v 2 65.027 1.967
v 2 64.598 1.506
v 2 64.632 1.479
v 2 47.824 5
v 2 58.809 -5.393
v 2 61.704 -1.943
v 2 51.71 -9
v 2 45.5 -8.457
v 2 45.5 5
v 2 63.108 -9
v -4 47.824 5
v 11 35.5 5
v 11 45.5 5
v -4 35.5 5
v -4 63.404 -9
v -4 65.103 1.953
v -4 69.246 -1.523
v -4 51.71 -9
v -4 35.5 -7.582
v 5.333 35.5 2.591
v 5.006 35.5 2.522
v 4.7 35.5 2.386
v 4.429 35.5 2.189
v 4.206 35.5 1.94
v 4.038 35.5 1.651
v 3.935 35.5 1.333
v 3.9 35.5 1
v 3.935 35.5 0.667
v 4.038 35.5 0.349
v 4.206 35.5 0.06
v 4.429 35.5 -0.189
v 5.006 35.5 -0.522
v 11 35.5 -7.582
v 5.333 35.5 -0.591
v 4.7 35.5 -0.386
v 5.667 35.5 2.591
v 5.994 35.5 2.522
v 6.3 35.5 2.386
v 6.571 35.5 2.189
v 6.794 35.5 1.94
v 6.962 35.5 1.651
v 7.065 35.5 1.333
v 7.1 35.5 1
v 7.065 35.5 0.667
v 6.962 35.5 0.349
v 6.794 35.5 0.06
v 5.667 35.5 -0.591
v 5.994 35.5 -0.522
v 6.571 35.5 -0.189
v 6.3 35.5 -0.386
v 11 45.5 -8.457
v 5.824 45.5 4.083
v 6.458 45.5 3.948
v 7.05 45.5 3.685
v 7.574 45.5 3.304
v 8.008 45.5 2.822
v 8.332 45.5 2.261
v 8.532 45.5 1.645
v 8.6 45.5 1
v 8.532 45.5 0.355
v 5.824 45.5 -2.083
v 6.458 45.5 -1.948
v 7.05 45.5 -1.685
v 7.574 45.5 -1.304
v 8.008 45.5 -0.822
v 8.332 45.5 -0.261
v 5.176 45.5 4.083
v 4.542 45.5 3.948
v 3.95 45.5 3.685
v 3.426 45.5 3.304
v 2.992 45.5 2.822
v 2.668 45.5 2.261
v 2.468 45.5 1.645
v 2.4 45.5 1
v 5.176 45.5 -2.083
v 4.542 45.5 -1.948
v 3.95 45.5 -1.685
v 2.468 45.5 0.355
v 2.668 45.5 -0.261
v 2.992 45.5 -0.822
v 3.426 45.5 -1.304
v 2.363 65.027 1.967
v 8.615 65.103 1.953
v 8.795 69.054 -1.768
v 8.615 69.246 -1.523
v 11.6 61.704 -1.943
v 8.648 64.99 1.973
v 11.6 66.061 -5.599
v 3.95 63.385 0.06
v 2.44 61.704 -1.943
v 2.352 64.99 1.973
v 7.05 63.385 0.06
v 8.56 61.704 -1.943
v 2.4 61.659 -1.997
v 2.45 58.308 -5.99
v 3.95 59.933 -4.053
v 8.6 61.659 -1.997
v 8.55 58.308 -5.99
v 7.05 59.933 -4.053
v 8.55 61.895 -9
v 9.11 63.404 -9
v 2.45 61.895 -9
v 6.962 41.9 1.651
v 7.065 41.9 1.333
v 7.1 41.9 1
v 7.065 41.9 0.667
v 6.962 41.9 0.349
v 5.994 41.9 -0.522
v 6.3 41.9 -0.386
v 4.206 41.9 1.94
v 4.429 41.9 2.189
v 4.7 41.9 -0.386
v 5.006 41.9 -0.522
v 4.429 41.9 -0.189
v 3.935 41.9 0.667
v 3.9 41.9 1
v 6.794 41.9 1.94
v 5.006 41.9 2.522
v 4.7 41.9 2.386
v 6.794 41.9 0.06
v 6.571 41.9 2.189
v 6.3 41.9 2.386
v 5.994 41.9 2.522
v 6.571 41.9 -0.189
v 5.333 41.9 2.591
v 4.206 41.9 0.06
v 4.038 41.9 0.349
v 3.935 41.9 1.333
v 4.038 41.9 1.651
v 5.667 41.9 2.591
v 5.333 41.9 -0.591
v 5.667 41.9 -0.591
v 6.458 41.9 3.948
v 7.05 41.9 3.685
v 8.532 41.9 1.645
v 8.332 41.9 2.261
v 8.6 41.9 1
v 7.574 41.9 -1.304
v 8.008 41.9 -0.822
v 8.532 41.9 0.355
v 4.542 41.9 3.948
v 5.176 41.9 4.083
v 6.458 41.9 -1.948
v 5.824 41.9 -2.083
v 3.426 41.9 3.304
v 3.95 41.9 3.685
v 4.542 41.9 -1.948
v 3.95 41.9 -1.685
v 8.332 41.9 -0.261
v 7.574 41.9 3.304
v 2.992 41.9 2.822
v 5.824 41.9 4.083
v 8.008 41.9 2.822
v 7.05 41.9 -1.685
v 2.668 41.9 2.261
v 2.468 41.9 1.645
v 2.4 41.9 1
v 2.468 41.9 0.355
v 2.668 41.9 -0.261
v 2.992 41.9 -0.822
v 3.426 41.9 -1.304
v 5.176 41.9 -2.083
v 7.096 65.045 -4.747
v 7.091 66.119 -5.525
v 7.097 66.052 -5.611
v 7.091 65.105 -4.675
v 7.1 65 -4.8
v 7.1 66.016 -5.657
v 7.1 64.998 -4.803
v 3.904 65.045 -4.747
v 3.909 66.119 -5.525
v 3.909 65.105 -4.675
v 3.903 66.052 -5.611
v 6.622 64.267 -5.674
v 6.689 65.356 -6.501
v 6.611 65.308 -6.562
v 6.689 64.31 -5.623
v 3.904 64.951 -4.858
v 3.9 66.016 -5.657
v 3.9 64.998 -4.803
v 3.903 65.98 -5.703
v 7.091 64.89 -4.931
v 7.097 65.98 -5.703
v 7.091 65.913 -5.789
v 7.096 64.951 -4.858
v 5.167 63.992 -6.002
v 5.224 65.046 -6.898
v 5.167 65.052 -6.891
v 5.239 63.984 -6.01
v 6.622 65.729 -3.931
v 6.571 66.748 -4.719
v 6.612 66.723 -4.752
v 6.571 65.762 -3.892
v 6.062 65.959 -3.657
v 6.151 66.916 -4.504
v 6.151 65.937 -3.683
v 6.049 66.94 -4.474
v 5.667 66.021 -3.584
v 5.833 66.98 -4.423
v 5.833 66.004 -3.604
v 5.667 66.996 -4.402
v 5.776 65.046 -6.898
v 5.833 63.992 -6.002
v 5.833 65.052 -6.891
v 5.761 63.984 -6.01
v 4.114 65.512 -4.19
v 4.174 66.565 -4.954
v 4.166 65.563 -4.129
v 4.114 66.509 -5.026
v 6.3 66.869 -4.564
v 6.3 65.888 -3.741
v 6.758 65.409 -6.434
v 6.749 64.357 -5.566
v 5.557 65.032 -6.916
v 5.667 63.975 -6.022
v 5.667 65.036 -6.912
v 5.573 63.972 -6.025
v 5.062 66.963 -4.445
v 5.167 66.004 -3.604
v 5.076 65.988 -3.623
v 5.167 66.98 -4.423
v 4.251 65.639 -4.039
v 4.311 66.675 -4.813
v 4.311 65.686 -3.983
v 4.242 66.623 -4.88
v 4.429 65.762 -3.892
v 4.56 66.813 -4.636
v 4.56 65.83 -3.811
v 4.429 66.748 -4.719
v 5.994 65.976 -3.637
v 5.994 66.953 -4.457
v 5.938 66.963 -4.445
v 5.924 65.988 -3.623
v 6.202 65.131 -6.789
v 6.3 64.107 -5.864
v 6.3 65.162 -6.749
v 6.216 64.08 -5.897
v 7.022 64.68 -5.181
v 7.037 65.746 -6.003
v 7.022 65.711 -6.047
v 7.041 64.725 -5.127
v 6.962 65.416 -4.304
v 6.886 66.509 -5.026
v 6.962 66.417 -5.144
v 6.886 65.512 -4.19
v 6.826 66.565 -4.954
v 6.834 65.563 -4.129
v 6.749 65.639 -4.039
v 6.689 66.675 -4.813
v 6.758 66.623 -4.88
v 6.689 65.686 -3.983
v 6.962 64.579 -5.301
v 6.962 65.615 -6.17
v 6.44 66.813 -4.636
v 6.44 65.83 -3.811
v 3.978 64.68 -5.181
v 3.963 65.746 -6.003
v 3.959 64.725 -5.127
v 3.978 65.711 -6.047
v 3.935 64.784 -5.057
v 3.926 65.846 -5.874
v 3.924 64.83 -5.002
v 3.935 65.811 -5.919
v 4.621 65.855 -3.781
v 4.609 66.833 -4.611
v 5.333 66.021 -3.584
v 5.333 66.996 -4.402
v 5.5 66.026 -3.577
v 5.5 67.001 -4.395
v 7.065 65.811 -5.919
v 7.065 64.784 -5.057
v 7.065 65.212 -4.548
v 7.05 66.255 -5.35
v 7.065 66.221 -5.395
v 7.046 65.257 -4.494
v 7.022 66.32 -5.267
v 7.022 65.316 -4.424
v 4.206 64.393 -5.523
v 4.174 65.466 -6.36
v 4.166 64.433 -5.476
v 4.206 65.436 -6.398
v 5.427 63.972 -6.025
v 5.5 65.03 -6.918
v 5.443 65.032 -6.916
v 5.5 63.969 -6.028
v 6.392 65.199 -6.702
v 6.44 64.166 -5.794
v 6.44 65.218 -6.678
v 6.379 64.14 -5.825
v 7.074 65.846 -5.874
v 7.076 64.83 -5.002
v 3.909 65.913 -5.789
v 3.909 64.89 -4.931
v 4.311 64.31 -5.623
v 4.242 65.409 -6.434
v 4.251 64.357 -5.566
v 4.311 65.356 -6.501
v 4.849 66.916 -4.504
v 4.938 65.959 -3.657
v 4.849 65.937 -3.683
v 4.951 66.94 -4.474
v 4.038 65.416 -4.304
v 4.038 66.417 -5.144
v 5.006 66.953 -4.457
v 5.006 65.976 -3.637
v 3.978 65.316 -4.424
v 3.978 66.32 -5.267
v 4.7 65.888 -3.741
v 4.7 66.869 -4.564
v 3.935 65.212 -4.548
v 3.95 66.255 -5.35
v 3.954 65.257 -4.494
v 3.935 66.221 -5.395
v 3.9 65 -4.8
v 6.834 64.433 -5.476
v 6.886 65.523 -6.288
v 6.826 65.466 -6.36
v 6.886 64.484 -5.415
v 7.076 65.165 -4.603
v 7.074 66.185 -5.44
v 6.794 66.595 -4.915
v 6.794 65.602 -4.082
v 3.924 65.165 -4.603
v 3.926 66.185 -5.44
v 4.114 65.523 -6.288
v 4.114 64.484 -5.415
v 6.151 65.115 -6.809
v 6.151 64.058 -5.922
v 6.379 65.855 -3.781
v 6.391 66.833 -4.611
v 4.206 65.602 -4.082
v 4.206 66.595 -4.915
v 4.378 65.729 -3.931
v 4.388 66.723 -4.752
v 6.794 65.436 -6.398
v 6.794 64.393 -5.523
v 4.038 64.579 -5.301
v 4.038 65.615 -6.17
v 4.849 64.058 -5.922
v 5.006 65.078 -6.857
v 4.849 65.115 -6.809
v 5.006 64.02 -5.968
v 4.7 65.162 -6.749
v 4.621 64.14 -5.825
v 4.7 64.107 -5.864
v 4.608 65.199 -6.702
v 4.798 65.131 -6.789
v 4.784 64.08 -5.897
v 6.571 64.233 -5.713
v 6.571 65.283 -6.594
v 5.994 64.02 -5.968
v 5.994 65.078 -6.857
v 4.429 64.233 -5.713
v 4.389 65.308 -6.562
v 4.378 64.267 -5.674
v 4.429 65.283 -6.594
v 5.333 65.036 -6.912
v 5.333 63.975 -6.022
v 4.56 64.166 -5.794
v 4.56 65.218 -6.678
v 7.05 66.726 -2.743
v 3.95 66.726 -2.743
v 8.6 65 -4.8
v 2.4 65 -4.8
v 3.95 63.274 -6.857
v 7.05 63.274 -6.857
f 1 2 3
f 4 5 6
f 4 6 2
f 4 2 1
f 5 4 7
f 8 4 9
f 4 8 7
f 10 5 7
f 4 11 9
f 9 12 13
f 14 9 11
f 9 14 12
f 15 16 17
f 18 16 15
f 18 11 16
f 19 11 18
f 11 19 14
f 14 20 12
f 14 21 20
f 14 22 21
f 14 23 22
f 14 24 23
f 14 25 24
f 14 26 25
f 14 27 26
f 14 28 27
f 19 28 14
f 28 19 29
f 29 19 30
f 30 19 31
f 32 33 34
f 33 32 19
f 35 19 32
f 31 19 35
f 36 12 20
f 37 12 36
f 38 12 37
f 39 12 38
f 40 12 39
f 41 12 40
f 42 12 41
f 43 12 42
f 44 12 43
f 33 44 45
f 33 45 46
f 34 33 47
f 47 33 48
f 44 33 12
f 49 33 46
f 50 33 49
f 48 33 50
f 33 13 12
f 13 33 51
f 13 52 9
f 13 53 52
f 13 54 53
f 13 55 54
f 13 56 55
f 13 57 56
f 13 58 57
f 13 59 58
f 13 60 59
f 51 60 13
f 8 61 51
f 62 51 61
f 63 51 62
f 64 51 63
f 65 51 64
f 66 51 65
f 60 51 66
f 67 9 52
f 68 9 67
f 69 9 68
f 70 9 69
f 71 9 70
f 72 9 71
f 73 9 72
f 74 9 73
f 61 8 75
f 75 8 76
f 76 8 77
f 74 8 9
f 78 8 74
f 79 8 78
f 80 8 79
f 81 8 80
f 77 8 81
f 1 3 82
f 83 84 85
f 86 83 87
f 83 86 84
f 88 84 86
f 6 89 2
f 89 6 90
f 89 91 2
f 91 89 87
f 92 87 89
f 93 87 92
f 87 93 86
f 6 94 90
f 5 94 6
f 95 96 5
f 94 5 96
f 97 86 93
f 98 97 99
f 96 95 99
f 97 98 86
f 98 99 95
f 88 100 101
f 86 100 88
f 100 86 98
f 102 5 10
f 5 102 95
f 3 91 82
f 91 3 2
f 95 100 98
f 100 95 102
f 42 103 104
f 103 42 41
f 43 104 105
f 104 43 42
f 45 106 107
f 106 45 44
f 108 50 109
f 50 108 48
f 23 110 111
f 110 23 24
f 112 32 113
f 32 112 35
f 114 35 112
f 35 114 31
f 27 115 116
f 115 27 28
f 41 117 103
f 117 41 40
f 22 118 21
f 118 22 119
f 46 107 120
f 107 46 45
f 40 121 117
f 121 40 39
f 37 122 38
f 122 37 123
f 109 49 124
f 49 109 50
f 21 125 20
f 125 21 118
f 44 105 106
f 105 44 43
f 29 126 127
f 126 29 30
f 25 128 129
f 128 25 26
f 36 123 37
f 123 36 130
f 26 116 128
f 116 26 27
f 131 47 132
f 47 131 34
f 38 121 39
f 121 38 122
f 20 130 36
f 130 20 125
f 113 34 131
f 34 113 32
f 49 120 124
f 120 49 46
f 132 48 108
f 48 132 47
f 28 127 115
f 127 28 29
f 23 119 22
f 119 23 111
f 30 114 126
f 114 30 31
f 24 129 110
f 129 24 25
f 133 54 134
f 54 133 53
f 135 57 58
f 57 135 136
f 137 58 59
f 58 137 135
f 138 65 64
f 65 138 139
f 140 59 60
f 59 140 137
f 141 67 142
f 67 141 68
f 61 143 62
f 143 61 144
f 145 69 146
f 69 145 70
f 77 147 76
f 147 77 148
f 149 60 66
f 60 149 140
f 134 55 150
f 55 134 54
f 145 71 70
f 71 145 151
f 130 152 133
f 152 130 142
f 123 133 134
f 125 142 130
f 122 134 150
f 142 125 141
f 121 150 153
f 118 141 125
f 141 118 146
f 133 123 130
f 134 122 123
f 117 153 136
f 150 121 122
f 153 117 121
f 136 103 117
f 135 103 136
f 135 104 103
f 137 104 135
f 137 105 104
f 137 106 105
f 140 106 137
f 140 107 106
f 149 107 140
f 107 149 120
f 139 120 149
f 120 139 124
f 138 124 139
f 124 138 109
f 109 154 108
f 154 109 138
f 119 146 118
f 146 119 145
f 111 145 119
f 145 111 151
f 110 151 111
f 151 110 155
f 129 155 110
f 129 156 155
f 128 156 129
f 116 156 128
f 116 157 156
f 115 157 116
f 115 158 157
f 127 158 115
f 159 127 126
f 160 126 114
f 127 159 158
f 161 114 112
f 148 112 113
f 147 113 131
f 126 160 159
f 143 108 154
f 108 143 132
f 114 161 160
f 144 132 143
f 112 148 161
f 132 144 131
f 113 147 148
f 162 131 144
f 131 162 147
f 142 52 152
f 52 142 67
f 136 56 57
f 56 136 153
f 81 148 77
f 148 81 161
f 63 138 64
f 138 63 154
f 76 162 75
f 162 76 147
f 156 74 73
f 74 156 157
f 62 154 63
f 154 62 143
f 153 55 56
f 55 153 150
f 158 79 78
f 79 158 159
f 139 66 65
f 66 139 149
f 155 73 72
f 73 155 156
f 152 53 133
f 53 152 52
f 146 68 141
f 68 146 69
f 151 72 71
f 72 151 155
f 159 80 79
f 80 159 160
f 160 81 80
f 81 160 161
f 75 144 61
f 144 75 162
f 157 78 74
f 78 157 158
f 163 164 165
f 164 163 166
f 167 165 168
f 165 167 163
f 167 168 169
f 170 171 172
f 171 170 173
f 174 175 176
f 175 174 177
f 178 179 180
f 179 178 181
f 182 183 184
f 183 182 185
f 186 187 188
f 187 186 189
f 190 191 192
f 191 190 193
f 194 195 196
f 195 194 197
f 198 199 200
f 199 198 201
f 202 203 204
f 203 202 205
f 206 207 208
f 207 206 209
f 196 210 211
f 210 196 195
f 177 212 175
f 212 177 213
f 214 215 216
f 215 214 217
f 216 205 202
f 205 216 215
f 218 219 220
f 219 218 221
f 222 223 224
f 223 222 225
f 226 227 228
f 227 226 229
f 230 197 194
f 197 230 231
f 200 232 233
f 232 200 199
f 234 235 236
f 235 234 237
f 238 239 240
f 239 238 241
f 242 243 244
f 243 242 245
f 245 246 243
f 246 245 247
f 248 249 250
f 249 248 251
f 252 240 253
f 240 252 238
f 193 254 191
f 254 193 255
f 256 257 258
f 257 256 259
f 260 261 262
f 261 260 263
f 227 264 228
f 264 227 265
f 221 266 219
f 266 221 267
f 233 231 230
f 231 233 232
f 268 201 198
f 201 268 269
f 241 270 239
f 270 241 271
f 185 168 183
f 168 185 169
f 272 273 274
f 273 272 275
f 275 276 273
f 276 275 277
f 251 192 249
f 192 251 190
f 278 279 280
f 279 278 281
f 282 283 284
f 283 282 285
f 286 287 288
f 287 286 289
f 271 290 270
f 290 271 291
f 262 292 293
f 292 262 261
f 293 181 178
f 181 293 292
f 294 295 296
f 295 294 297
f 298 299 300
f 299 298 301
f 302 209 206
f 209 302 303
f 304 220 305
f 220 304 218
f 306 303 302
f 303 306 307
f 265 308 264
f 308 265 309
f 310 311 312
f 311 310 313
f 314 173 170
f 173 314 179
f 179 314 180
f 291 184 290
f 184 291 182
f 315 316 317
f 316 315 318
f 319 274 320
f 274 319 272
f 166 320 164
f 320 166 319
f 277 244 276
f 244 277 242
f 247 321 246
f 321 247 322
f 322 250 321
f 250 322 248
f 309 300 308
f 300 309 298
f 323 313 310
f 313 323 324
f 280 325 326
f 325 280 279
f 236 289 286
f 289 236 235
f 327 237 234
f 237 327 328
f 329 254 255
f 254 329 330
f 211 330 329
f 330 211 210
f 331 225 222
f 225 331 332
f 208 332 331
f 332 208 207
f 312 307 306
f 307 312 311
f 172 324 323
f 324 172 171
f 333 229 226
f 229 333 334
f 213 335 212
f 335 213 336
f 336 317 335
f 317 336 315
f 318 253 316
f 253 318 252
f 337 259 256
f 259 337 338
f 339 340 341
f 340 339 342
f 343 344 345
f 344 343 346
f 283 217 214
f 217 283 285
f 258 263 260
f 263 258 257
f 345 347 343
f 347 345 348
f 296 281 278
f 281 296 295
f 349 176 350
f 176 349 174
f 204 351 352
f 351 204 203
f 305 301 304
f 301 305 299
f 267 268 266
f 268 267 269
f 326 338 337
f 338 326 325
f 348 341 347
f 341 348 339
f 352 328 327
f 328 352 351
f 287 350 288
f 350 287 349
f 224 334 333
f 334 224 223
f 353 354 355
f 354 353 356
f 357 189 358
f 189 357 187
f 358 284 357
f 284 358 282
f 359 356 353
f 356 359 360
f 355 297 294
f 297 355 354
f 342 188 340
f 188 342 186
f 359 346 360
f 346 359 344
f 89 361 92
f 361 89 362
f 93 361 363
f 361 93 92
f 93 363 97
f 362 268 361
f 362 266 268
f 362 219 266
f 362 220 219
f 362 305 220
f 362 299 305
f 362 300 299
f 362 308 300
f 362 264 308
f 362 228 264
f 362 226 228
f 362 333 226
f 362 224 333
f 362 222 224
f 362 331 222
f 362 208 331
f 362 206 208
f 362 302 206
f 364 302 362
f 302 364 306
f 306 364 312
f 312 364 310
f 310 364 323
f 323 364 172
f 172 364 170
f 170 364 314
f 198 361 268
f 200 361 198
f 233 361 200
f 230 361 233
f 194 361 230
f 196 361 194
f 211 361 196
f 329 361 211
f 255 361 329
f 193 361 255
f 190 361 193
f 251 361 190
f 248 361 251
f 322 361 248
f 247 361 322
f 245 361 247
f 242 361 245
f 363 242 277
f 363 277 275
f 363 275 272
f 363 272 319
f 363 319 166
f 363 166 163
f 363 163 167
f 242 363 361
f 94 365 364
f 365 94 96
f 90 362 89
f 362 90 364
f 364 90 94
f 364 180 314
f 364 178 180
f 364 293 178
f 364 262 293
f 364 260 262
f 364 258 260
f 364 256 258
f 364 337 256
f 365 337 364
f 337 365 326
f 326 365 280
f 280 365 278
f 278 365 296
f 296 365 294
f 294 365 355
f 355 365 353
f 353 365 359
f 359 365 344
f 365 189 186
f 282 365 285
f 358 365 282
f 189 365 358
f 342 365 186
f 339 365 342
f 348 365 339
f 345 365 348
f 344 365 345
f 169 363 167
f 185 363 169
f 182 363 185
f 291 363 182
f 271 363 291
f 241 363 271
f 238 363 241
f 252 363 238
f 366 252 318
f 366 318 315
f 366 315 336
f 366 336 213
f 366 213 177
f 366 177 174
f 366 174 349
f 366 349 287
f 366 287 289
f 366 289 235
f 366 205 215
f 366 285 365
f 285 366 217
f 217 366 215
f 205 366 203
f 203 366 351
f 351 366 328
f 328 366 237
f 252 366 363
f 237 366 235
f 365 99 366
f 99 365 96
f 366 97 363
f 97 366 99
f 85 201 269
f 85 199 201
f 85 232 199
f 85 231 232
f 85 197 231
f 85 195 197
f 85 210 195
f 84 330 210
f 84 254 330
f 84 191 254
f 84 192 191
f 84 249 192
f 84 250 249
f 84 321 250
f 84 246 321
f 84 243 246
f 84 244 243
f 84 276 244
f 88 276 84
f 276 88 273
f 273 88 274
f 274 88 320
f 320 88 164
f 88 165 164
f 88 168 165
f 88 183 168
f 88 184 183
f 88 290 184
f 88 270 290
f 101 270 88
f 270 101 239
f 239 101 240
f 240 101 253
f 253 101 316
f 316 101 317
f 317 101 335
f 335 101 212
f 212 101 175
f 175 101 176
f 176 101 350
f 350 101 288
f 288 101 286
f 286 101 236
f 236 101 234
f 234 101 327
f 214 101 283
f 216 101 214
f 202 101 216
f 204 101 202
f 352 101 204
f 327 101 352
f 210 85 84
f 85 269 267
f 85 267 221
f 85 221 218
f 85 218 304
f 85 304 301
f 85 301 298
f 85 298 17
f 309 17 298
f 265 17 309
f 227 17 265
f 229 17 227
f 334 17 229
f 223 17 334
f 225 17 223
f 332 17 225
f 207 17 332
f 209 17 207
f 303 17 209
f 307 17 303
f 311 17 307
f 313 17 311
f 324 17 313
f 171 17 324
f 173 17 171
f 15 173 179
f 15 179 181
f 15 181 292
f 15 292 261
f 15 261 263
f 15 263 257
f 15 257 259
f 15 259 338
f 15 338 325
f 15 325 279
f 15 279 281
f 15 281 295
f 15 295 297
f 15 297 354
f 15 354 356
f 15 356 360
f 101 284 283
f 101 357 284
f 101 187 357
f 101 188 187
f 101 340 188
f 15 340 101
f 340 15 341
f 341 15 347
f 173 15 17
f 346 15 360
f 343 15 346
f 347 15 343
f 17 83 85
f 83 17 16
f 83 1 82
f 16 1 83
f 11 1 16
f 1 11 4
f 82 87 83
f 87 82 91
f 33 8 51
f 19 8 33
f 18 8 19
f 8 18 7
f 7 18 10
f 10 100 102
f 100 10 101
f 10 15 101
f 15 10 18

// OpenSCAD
//#import("nozzle-fan.stl");
//#translate([0, -4.5, 0]) rotate([90, 0, 180]) import("extruder-body.stl");
//translate([0, -4.5, 0]) rotate([90, 0, 0]) import("extruder-cover.stl");
//translate([0, 0, 0]) rotate([0, 0, 0]) import("hot21_45_2.stl");
//use<nozzle-fan-old.scad>;
//%rotate([90, 0, 0]) fan_nozzle_old();

difference()
{
    union()
    {
        translate([-4, 35.5, -25]) cube([6, 45, 30]);
        translate([-4, 35.5, -25]) cube([15, 10, 30]);
        translate([-4, 68, -12]) rotate([51, 0, 0]) cube([10, 15, 11.1]);
        translate([5.5, 66.3, -5.8]) rotate([50, 0, 0]) cylinder(r = 6.1, h = 6, $fn = 6);
    }

    translate([5.5, 42, 1]) rotate([90, 0, 0]) cylinder(r = 1.6, h = 10, $fn = 30);
    translate([5.5, 46.9, 1]) rotate([90, 0, 0]) cylinder(r = 3.1, h = 5, $fn = 30);

    //#translate([5.5, 70, -7]) rotate([50, 0, 0]) cylinder(r = 1.6, h = 15, $fn = 60);
    translate([5.5, 70, -9]) rotate([50, 0, 0]) cylinder(r = 1.6, h = 15, $fn = 60);
    translate([5.5, 65, -4.8]) rotate([50, 0, 0]) cylinder(r = 3.1, h = 17, $fn = 6);

    translate([-25, 46.5, -55]) rotate([52, 0, 0]) cube([50, 150, 15]);
    translate([-25, 46.5, -66]) rotate([50, 0, 0]) cube([50, 150, 15]);
    translate([-25, 86, 4]) rotate([50 + 90, 0, 0]) cube([50, 150, 15]);
    translate([-25, 86, 13.5]) rotate([170, 0, 0]) cube([50, 150, 15]);
    translate([-25, 86, -12]) rotate([175, 0, 0]) cube([50, 150, 15]);

    translate([-5, 35, -25]) cube([20, 45, 16]);
}
